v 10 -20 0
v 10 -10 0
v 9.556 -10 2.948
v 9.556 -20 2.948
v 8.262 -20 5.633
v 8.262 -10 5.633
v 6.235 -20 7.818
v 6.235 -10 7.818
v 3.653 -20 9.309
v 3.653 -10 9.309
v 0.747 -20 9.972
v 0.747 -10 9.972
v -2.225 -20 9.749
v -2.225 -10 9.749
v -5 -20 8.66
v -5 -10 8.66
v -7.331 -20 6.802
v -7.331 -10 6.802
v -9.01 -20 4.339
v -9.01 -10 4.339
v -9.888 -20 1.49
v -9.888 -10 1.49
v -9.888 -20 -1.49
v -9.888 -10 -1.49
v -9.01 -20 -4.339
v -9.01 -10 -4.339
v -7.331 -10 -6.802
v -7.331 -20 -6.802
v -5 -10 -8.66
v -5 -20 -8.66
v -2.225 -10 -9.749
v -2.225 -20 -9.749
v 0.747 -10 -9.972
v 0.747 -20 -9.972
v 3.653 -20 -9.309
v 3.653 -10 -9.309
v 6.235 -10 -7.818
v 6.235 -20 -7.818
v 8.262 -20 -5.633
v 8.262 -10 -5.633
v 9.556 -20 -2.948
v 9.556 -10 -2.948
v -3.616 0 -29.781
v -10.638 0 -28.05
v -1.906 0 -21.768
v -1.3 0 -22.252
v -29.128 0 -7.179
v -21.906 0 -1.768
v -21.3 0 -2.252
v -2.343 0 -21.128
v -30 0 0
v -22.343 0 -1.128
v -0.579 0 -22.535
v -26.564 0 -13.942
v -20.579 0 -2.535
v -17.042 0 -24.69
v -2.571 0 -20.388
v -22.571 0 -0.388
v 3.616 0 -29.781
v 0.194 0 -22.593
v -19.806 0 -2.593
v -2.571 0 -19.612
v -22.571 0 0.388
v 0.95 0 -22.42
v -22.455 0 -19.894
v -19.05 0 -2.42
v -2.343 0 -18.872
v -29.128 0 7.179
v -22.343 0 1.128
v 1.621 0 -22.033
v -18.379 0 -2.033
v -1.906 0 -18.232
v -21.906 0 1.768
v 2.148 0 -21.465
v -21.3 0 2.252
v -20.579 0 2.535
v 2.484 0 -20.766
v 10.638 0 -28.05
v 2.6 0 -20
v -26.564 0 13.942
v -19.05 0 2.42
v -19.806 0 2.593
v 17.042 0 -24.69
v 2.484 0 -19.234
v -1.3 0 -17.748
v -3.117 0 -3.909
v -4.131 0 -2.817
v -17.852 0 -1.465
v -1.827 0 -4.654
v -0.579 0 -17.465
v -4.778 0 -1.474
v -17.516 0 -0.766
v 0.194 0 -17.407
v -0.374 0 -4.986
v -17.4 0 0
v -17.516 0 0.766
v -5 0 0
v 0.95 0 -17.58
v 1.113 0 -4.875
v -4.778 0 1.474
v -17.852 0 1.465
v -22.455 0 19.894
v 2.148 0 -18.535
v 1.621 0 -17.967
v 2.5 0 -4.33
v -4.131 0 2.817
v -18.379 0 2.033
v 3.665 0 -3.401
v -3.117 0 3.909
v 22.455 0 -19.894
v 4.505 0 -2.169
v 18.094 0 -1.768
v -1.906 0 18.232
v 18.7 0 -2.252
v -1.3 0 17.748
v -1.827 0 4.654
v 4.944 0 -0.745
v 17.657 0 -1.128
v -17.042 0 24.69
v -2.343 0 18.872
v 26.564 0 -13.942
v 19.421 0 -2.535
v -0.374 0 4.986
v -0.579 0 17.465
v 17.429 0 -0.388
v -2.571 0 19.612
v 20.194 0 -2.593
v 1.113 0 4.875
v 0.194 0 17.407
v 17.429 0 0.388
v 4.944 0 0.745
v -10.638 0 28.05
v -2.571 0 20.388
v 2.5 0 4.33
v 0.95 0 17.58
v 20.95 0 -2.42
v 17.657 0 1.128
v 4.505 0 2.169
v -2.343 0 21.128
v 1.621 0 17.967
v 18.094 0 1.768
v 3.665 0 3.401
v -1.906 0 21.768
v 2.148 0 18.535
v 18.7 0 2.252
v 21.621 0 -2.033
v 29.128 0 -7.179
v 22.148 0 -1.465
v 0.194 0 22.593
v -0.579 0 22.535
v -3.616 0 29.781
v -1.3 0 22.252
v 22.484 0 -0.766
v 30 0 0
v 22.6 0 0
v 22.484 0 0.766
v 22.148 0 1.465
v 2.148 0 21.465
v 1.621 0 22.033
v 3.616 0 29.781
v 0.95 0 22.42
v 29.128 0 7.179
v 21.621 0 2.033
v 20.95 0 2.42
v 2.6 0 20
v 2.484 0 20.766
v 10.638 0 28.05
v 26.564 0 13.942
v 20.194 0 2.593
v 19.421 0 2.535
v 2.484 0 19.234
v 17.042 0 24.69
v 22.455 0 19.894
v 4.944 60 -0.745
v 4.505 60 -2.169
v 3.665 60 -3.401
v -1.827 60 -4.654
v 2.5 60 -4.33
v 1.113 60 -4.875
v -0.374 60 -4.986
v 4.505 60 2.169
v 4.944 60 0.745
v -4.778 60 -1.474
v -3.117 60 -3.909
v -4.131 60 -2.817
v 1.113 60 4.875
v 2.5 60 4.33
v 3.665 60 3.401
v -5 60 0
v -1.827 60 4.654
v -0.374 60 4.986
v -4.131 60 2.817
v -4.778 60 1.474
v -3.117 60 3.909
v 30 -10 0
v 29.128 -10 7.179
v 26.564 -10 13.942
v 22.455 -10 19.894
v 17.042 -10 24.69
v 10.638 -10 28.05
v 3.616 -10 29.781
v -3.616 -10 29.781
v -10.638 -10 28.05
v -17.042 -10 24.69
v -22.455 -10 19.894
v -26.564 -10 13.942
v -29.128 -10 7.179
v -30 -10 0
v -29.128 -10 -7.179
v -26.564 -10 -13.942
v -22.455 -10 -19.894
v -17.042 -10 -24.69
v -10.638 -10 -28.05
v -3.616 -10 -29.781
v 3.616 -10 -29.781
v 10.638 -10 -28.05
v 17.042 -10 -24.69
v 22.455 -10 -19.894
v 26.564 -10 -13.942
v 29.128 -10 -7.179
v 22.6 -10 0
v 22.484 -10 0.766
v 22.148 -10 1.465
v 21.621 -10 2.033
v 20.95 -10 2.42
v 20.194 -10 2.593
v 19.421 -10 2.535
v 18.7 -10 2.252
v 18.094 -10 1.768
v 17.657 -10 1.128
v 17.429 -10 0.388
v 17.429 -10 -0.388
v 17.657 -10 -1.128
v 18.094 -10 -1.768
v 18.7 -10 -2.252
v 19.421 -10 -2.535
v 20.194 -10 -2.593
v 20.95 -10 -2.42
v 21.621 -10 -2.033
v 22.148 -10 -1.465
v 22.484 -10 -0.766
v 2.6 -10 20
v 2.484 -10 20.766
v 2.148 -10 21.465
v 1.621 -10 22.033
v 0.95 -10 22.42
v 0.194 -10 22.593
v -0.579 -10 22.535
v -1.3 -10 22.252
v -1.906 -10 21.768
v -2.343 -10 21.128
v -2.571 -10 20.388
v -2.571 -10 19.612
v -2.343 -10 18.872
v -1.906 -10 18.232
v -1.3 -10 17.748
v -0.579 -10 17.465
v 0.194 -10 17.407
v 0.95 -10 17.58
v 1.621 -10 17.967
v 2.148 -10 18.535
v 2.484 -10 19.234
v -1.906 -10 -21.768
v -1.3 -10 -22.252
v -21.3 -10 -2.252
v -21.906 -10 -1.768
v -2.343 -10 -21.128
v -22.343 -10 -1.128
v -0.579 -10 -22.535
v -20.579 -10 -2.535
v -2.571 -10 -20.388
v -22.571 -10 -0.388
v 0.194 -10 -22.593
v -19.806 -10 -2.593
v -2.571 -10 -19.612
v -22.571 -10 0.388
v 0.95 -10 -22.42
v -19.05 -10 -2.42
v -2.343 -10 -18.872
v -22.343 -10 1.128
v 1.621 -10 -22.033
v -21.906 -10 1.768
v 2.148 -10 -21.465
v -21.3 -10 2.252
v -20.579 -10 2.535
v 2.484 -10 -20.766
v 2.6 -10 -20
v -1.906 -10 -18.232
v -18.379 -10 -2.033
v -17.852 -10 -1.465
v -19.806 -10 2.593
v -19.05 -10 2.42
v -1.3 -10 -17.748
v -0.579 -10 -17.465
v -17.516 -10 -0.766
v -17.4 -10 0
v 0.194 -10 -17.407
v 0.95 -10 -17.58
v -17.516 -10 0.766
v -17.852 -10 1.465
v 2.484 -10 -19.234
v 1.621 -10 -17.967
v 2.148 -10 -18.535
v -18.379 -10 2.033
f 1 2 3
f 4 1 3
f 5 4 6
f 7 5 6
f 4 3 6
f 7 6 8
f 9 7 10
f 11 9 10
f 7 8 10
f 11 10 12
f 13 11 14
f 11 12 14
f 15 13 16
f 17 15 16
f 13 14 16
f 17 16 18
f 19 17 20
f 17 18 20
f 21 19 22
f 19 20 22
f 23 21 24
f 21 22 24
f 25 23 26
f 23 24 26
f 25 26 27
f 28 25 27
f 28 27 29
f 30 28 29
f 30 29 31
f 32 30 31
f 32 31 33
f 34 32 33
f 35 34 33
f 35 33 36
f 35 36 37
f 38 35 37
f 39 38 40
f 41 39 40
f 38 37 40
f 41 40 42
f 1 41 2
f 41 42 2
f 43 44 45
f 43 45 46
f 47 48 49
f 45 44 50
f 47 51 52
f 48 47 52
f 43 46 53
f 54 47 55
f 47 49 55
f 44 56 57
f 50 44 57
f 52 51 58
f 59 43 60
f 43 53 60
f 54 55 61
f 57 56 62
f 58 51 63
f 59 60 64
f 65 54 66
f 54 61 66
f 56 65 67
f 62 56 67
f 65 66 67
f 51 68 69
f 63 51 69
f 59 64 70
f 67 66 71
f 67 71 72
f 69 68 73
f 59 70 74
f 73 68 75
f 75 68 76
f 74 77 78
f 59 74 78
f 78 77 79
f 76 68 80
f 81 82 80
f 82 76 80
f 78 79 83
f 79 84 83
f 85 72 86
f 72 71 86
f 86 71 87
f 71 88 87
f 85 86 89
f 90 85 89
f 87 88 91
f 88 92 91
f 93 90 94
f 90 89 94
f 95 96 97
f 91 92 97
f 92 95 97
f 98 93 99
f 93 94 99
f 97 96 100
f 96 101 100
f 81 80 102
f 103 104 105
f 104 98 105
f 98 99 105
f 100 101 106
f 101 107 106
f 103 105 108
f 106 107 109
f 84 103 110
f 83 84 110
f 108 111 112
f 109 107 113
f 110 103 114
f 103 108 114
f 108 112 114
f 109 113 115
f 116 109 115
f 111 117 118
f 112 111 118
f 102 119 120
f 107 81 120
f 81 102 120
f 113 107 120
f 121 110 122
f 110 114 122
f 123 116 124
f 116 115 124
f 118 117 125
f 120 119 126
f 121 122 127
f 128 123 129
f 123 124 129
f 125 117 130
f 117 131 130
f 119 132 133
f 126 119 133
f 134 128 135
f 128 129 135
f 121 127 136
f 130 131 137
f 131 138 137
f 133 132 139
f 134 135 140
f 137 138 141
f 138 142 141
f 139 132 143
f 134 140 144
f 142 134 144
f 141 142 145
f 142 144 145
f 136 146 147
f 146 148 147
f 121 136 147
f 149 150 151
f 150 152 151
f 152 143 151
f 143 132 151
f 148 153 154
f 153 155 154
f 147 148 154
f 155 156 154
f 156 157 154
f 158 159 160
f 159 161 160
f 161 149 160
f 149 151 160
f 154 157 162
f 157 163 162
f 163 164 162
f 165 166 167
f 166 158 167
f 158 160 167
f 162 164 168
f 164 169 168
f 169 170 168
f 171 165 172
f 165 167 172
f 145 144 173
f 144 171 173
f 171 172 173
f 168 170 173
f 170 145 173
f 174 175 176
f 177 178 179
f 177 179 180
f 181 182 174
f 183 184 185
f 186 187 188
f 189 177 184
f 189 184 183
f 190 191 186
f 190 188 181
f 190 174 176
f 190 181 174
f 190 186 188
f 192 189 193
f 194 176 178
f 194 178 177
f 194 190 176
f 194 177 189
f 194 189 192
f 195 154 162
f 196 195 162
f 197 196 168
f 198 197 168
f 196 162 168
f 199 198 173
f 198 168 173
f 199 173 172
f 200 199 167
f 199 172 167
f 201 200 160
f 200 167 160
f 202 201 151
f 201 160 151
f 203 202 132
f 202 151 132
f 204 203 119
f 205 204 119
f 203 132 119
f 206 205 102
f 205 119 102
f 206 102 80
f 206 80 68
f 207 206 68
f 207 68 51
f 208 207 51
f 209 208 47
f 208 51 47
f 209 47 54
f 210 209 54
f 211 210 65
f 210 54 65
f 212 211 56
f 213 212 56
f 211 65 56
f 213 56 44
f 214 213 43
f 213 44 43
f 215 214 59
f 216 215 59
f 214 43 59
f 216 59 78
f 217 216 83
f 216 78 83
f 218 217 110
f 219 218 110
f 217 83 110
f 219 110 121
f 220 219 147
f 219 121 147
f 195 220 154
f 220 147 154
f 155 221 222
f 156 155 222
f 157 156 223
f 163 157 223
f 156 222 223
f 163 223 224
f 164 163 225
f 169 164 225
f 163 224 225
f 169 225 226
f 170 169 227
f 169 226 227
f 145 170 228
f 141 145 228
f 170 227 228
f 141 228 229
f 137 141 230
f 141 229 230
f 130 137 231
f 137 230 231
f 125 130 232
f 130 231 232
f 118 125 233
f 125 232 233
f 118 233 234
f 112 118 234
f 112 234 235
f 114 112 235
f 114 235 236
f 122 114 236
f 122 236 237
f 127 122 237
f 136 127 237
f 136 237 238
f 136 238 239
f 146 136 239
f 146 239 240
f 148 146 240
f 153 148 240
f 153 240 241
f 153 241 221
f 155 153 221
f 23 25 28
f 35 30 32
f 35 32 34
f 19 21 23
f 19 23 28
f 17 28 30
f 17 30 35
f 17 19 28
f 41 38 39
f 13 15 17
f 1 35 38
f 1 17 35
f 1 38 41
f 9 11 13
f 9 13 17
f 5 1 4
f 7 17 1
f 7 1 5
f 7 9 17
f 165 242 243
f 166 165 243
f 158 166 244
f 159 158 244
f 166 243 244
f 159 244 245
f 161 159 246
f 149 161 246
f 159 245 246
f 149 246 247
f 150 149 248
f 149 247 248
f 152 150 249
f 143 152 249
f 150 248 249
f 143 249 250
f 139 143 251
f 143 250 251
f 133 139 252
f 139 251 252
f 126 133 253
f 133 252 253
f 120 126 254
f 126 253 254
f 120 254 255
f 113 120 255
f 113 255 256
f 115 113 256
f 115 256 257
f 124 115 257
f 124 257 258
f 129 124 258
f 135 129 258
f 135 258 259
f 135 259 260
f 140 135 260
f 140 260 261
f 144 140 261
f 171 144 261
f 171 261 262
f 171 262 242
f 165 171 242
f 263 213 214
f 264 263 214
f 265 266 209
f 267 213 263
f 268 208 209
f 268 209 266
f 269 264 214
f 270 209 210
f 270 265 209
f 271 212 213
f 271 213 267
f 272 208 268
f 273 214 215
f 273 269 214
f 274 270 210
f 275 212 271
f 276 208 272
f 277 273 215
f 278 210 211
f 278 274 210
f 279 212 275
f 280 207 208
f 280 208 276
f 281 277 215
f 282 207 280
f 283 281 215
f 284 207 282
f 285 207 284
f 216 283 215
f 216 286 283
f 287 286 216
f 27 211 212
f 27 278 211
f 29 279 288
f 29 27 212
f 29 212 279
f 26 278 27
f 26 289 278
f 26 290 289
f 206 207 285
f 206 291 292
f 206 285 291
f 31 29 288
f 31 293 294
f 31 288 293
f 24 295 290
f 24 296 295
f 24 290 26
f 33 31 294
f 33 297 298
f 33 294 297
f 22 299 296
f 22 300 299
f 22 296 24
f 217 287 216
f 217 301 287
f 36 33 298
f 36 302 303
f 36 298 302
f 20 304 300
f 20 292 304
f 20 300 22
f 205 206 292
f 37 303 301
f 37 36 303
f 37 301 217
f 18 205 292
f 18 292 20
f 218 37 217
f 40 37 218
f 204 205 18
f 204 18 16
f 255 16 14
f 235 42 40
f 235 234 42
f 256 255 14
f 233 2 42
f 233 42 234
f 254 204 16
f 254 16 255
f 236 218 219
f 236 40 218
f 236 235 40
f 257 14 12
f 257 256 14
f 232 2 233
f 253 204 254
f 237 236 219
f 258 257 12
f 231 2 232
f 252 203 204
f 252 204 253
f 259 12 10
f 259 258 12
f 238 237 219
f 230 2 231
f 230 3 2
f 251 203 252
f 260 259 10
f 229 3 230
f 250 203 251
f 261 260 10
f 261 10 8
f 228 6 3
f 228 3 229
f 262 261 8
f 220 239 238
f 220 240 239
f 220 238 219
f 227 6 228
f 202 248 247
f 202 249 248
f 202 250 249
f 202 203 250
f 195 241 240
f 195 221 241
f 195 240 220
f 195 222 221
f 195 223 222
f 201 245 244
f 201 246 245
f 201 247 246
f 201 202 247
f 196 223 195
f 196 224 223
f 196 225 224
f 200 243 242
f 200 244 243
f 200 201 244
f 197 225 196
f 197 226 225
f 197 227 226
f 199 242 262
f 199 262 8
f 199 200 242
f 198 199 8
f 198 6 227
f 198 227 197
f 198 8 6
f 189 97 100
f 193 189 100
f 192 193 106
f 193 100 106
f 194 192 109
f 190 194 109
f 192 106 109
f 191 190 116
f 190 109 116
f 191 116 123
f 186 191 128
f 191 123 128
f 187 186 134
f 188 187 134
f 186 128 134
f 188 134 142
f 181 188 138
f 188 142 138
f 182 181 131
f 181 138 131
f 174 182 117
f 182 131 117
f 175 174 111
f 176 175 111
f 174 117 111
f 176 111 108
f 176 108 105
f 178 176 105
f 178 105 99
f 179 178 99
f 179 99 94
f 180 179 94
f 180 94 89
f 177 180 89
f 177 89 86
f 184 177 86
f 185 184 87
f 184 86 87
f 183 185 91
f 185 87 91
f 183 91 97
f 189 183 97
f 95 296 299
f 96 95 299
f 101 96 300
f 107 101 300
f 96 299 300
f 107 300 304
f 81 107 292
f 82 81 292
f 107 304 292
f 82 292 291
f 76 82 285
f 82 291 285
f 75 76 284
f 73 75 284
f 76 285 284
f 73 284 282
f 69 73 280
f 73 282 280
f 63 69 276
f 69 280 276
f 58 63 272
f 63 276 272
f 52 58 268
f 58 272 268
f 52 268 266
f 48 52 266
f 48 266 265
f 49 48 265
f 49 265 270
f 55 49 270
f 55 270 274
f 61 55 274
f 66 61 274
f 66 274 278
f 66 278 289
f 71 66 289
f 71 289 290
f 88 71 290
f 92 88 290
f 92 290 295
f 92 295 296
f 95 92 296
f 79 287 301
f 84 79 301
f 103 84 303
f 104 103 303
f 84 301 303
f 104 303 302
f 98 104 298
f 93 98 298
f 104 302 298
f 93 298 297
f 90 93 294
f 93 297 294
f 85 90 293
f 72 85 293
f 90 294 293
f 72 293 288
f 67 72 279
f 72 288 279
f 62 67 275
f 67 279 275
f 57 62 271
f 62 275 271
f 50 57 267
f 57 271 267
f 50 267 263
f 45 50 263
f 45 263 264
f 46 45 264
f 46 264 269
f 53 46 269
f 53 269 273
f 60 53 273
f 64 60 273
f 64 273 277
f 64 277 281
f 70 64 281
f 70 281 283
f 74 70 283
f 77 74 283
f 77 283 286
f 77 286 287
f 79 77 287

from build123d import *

# Parameters (mm, degrees)
F0_R     = 30
F1_DEPTH = 10
F2_R     = 2.6
F3_DEPTH = 25
F4_R     = 10
F5_DEPTH = 10
F6_R     = 5
F7_DEPTH = 60


with BuildPart() as f1:
    # F0 (on Front) → F1 (new body)
    with BuildSketch(Plane.XZ):
        Circle(F0_R)
    extrude(amount=F1_DEPTH)

    # F2 (on face) → F3 (cut)
    with BuildSketch(Plane.XZ.offset(10)):
        with Locations((-20, 0)):
            Circle(F2_R)
        with Locations((0, 20)):
            Circle(F2_R)
        with Locations((20, 0)):
            Circle(F2_R)
        with Locations((0, -20)):
            Circle(F2_R)
    extrude(amount=-F3_DEPTH, mode=Mode.SUBTRACT)

    # F4 (on face) → F5 (join)
    with BuildSketch(Plane.XZ.offset(10)):
        Circle(F4_R)
    extrude(amount=F5_DEPTH)

    # F6 (on face) → F7 (join)
    with BuildSketch(Plane(origin=(0, 0, 0), x_dir=(-1, 0, 0), z_dir=(0, 1, 0))):
        Circle(F6_R)
    extrude(amount=F7_DEPTH)


solid = f1.part
